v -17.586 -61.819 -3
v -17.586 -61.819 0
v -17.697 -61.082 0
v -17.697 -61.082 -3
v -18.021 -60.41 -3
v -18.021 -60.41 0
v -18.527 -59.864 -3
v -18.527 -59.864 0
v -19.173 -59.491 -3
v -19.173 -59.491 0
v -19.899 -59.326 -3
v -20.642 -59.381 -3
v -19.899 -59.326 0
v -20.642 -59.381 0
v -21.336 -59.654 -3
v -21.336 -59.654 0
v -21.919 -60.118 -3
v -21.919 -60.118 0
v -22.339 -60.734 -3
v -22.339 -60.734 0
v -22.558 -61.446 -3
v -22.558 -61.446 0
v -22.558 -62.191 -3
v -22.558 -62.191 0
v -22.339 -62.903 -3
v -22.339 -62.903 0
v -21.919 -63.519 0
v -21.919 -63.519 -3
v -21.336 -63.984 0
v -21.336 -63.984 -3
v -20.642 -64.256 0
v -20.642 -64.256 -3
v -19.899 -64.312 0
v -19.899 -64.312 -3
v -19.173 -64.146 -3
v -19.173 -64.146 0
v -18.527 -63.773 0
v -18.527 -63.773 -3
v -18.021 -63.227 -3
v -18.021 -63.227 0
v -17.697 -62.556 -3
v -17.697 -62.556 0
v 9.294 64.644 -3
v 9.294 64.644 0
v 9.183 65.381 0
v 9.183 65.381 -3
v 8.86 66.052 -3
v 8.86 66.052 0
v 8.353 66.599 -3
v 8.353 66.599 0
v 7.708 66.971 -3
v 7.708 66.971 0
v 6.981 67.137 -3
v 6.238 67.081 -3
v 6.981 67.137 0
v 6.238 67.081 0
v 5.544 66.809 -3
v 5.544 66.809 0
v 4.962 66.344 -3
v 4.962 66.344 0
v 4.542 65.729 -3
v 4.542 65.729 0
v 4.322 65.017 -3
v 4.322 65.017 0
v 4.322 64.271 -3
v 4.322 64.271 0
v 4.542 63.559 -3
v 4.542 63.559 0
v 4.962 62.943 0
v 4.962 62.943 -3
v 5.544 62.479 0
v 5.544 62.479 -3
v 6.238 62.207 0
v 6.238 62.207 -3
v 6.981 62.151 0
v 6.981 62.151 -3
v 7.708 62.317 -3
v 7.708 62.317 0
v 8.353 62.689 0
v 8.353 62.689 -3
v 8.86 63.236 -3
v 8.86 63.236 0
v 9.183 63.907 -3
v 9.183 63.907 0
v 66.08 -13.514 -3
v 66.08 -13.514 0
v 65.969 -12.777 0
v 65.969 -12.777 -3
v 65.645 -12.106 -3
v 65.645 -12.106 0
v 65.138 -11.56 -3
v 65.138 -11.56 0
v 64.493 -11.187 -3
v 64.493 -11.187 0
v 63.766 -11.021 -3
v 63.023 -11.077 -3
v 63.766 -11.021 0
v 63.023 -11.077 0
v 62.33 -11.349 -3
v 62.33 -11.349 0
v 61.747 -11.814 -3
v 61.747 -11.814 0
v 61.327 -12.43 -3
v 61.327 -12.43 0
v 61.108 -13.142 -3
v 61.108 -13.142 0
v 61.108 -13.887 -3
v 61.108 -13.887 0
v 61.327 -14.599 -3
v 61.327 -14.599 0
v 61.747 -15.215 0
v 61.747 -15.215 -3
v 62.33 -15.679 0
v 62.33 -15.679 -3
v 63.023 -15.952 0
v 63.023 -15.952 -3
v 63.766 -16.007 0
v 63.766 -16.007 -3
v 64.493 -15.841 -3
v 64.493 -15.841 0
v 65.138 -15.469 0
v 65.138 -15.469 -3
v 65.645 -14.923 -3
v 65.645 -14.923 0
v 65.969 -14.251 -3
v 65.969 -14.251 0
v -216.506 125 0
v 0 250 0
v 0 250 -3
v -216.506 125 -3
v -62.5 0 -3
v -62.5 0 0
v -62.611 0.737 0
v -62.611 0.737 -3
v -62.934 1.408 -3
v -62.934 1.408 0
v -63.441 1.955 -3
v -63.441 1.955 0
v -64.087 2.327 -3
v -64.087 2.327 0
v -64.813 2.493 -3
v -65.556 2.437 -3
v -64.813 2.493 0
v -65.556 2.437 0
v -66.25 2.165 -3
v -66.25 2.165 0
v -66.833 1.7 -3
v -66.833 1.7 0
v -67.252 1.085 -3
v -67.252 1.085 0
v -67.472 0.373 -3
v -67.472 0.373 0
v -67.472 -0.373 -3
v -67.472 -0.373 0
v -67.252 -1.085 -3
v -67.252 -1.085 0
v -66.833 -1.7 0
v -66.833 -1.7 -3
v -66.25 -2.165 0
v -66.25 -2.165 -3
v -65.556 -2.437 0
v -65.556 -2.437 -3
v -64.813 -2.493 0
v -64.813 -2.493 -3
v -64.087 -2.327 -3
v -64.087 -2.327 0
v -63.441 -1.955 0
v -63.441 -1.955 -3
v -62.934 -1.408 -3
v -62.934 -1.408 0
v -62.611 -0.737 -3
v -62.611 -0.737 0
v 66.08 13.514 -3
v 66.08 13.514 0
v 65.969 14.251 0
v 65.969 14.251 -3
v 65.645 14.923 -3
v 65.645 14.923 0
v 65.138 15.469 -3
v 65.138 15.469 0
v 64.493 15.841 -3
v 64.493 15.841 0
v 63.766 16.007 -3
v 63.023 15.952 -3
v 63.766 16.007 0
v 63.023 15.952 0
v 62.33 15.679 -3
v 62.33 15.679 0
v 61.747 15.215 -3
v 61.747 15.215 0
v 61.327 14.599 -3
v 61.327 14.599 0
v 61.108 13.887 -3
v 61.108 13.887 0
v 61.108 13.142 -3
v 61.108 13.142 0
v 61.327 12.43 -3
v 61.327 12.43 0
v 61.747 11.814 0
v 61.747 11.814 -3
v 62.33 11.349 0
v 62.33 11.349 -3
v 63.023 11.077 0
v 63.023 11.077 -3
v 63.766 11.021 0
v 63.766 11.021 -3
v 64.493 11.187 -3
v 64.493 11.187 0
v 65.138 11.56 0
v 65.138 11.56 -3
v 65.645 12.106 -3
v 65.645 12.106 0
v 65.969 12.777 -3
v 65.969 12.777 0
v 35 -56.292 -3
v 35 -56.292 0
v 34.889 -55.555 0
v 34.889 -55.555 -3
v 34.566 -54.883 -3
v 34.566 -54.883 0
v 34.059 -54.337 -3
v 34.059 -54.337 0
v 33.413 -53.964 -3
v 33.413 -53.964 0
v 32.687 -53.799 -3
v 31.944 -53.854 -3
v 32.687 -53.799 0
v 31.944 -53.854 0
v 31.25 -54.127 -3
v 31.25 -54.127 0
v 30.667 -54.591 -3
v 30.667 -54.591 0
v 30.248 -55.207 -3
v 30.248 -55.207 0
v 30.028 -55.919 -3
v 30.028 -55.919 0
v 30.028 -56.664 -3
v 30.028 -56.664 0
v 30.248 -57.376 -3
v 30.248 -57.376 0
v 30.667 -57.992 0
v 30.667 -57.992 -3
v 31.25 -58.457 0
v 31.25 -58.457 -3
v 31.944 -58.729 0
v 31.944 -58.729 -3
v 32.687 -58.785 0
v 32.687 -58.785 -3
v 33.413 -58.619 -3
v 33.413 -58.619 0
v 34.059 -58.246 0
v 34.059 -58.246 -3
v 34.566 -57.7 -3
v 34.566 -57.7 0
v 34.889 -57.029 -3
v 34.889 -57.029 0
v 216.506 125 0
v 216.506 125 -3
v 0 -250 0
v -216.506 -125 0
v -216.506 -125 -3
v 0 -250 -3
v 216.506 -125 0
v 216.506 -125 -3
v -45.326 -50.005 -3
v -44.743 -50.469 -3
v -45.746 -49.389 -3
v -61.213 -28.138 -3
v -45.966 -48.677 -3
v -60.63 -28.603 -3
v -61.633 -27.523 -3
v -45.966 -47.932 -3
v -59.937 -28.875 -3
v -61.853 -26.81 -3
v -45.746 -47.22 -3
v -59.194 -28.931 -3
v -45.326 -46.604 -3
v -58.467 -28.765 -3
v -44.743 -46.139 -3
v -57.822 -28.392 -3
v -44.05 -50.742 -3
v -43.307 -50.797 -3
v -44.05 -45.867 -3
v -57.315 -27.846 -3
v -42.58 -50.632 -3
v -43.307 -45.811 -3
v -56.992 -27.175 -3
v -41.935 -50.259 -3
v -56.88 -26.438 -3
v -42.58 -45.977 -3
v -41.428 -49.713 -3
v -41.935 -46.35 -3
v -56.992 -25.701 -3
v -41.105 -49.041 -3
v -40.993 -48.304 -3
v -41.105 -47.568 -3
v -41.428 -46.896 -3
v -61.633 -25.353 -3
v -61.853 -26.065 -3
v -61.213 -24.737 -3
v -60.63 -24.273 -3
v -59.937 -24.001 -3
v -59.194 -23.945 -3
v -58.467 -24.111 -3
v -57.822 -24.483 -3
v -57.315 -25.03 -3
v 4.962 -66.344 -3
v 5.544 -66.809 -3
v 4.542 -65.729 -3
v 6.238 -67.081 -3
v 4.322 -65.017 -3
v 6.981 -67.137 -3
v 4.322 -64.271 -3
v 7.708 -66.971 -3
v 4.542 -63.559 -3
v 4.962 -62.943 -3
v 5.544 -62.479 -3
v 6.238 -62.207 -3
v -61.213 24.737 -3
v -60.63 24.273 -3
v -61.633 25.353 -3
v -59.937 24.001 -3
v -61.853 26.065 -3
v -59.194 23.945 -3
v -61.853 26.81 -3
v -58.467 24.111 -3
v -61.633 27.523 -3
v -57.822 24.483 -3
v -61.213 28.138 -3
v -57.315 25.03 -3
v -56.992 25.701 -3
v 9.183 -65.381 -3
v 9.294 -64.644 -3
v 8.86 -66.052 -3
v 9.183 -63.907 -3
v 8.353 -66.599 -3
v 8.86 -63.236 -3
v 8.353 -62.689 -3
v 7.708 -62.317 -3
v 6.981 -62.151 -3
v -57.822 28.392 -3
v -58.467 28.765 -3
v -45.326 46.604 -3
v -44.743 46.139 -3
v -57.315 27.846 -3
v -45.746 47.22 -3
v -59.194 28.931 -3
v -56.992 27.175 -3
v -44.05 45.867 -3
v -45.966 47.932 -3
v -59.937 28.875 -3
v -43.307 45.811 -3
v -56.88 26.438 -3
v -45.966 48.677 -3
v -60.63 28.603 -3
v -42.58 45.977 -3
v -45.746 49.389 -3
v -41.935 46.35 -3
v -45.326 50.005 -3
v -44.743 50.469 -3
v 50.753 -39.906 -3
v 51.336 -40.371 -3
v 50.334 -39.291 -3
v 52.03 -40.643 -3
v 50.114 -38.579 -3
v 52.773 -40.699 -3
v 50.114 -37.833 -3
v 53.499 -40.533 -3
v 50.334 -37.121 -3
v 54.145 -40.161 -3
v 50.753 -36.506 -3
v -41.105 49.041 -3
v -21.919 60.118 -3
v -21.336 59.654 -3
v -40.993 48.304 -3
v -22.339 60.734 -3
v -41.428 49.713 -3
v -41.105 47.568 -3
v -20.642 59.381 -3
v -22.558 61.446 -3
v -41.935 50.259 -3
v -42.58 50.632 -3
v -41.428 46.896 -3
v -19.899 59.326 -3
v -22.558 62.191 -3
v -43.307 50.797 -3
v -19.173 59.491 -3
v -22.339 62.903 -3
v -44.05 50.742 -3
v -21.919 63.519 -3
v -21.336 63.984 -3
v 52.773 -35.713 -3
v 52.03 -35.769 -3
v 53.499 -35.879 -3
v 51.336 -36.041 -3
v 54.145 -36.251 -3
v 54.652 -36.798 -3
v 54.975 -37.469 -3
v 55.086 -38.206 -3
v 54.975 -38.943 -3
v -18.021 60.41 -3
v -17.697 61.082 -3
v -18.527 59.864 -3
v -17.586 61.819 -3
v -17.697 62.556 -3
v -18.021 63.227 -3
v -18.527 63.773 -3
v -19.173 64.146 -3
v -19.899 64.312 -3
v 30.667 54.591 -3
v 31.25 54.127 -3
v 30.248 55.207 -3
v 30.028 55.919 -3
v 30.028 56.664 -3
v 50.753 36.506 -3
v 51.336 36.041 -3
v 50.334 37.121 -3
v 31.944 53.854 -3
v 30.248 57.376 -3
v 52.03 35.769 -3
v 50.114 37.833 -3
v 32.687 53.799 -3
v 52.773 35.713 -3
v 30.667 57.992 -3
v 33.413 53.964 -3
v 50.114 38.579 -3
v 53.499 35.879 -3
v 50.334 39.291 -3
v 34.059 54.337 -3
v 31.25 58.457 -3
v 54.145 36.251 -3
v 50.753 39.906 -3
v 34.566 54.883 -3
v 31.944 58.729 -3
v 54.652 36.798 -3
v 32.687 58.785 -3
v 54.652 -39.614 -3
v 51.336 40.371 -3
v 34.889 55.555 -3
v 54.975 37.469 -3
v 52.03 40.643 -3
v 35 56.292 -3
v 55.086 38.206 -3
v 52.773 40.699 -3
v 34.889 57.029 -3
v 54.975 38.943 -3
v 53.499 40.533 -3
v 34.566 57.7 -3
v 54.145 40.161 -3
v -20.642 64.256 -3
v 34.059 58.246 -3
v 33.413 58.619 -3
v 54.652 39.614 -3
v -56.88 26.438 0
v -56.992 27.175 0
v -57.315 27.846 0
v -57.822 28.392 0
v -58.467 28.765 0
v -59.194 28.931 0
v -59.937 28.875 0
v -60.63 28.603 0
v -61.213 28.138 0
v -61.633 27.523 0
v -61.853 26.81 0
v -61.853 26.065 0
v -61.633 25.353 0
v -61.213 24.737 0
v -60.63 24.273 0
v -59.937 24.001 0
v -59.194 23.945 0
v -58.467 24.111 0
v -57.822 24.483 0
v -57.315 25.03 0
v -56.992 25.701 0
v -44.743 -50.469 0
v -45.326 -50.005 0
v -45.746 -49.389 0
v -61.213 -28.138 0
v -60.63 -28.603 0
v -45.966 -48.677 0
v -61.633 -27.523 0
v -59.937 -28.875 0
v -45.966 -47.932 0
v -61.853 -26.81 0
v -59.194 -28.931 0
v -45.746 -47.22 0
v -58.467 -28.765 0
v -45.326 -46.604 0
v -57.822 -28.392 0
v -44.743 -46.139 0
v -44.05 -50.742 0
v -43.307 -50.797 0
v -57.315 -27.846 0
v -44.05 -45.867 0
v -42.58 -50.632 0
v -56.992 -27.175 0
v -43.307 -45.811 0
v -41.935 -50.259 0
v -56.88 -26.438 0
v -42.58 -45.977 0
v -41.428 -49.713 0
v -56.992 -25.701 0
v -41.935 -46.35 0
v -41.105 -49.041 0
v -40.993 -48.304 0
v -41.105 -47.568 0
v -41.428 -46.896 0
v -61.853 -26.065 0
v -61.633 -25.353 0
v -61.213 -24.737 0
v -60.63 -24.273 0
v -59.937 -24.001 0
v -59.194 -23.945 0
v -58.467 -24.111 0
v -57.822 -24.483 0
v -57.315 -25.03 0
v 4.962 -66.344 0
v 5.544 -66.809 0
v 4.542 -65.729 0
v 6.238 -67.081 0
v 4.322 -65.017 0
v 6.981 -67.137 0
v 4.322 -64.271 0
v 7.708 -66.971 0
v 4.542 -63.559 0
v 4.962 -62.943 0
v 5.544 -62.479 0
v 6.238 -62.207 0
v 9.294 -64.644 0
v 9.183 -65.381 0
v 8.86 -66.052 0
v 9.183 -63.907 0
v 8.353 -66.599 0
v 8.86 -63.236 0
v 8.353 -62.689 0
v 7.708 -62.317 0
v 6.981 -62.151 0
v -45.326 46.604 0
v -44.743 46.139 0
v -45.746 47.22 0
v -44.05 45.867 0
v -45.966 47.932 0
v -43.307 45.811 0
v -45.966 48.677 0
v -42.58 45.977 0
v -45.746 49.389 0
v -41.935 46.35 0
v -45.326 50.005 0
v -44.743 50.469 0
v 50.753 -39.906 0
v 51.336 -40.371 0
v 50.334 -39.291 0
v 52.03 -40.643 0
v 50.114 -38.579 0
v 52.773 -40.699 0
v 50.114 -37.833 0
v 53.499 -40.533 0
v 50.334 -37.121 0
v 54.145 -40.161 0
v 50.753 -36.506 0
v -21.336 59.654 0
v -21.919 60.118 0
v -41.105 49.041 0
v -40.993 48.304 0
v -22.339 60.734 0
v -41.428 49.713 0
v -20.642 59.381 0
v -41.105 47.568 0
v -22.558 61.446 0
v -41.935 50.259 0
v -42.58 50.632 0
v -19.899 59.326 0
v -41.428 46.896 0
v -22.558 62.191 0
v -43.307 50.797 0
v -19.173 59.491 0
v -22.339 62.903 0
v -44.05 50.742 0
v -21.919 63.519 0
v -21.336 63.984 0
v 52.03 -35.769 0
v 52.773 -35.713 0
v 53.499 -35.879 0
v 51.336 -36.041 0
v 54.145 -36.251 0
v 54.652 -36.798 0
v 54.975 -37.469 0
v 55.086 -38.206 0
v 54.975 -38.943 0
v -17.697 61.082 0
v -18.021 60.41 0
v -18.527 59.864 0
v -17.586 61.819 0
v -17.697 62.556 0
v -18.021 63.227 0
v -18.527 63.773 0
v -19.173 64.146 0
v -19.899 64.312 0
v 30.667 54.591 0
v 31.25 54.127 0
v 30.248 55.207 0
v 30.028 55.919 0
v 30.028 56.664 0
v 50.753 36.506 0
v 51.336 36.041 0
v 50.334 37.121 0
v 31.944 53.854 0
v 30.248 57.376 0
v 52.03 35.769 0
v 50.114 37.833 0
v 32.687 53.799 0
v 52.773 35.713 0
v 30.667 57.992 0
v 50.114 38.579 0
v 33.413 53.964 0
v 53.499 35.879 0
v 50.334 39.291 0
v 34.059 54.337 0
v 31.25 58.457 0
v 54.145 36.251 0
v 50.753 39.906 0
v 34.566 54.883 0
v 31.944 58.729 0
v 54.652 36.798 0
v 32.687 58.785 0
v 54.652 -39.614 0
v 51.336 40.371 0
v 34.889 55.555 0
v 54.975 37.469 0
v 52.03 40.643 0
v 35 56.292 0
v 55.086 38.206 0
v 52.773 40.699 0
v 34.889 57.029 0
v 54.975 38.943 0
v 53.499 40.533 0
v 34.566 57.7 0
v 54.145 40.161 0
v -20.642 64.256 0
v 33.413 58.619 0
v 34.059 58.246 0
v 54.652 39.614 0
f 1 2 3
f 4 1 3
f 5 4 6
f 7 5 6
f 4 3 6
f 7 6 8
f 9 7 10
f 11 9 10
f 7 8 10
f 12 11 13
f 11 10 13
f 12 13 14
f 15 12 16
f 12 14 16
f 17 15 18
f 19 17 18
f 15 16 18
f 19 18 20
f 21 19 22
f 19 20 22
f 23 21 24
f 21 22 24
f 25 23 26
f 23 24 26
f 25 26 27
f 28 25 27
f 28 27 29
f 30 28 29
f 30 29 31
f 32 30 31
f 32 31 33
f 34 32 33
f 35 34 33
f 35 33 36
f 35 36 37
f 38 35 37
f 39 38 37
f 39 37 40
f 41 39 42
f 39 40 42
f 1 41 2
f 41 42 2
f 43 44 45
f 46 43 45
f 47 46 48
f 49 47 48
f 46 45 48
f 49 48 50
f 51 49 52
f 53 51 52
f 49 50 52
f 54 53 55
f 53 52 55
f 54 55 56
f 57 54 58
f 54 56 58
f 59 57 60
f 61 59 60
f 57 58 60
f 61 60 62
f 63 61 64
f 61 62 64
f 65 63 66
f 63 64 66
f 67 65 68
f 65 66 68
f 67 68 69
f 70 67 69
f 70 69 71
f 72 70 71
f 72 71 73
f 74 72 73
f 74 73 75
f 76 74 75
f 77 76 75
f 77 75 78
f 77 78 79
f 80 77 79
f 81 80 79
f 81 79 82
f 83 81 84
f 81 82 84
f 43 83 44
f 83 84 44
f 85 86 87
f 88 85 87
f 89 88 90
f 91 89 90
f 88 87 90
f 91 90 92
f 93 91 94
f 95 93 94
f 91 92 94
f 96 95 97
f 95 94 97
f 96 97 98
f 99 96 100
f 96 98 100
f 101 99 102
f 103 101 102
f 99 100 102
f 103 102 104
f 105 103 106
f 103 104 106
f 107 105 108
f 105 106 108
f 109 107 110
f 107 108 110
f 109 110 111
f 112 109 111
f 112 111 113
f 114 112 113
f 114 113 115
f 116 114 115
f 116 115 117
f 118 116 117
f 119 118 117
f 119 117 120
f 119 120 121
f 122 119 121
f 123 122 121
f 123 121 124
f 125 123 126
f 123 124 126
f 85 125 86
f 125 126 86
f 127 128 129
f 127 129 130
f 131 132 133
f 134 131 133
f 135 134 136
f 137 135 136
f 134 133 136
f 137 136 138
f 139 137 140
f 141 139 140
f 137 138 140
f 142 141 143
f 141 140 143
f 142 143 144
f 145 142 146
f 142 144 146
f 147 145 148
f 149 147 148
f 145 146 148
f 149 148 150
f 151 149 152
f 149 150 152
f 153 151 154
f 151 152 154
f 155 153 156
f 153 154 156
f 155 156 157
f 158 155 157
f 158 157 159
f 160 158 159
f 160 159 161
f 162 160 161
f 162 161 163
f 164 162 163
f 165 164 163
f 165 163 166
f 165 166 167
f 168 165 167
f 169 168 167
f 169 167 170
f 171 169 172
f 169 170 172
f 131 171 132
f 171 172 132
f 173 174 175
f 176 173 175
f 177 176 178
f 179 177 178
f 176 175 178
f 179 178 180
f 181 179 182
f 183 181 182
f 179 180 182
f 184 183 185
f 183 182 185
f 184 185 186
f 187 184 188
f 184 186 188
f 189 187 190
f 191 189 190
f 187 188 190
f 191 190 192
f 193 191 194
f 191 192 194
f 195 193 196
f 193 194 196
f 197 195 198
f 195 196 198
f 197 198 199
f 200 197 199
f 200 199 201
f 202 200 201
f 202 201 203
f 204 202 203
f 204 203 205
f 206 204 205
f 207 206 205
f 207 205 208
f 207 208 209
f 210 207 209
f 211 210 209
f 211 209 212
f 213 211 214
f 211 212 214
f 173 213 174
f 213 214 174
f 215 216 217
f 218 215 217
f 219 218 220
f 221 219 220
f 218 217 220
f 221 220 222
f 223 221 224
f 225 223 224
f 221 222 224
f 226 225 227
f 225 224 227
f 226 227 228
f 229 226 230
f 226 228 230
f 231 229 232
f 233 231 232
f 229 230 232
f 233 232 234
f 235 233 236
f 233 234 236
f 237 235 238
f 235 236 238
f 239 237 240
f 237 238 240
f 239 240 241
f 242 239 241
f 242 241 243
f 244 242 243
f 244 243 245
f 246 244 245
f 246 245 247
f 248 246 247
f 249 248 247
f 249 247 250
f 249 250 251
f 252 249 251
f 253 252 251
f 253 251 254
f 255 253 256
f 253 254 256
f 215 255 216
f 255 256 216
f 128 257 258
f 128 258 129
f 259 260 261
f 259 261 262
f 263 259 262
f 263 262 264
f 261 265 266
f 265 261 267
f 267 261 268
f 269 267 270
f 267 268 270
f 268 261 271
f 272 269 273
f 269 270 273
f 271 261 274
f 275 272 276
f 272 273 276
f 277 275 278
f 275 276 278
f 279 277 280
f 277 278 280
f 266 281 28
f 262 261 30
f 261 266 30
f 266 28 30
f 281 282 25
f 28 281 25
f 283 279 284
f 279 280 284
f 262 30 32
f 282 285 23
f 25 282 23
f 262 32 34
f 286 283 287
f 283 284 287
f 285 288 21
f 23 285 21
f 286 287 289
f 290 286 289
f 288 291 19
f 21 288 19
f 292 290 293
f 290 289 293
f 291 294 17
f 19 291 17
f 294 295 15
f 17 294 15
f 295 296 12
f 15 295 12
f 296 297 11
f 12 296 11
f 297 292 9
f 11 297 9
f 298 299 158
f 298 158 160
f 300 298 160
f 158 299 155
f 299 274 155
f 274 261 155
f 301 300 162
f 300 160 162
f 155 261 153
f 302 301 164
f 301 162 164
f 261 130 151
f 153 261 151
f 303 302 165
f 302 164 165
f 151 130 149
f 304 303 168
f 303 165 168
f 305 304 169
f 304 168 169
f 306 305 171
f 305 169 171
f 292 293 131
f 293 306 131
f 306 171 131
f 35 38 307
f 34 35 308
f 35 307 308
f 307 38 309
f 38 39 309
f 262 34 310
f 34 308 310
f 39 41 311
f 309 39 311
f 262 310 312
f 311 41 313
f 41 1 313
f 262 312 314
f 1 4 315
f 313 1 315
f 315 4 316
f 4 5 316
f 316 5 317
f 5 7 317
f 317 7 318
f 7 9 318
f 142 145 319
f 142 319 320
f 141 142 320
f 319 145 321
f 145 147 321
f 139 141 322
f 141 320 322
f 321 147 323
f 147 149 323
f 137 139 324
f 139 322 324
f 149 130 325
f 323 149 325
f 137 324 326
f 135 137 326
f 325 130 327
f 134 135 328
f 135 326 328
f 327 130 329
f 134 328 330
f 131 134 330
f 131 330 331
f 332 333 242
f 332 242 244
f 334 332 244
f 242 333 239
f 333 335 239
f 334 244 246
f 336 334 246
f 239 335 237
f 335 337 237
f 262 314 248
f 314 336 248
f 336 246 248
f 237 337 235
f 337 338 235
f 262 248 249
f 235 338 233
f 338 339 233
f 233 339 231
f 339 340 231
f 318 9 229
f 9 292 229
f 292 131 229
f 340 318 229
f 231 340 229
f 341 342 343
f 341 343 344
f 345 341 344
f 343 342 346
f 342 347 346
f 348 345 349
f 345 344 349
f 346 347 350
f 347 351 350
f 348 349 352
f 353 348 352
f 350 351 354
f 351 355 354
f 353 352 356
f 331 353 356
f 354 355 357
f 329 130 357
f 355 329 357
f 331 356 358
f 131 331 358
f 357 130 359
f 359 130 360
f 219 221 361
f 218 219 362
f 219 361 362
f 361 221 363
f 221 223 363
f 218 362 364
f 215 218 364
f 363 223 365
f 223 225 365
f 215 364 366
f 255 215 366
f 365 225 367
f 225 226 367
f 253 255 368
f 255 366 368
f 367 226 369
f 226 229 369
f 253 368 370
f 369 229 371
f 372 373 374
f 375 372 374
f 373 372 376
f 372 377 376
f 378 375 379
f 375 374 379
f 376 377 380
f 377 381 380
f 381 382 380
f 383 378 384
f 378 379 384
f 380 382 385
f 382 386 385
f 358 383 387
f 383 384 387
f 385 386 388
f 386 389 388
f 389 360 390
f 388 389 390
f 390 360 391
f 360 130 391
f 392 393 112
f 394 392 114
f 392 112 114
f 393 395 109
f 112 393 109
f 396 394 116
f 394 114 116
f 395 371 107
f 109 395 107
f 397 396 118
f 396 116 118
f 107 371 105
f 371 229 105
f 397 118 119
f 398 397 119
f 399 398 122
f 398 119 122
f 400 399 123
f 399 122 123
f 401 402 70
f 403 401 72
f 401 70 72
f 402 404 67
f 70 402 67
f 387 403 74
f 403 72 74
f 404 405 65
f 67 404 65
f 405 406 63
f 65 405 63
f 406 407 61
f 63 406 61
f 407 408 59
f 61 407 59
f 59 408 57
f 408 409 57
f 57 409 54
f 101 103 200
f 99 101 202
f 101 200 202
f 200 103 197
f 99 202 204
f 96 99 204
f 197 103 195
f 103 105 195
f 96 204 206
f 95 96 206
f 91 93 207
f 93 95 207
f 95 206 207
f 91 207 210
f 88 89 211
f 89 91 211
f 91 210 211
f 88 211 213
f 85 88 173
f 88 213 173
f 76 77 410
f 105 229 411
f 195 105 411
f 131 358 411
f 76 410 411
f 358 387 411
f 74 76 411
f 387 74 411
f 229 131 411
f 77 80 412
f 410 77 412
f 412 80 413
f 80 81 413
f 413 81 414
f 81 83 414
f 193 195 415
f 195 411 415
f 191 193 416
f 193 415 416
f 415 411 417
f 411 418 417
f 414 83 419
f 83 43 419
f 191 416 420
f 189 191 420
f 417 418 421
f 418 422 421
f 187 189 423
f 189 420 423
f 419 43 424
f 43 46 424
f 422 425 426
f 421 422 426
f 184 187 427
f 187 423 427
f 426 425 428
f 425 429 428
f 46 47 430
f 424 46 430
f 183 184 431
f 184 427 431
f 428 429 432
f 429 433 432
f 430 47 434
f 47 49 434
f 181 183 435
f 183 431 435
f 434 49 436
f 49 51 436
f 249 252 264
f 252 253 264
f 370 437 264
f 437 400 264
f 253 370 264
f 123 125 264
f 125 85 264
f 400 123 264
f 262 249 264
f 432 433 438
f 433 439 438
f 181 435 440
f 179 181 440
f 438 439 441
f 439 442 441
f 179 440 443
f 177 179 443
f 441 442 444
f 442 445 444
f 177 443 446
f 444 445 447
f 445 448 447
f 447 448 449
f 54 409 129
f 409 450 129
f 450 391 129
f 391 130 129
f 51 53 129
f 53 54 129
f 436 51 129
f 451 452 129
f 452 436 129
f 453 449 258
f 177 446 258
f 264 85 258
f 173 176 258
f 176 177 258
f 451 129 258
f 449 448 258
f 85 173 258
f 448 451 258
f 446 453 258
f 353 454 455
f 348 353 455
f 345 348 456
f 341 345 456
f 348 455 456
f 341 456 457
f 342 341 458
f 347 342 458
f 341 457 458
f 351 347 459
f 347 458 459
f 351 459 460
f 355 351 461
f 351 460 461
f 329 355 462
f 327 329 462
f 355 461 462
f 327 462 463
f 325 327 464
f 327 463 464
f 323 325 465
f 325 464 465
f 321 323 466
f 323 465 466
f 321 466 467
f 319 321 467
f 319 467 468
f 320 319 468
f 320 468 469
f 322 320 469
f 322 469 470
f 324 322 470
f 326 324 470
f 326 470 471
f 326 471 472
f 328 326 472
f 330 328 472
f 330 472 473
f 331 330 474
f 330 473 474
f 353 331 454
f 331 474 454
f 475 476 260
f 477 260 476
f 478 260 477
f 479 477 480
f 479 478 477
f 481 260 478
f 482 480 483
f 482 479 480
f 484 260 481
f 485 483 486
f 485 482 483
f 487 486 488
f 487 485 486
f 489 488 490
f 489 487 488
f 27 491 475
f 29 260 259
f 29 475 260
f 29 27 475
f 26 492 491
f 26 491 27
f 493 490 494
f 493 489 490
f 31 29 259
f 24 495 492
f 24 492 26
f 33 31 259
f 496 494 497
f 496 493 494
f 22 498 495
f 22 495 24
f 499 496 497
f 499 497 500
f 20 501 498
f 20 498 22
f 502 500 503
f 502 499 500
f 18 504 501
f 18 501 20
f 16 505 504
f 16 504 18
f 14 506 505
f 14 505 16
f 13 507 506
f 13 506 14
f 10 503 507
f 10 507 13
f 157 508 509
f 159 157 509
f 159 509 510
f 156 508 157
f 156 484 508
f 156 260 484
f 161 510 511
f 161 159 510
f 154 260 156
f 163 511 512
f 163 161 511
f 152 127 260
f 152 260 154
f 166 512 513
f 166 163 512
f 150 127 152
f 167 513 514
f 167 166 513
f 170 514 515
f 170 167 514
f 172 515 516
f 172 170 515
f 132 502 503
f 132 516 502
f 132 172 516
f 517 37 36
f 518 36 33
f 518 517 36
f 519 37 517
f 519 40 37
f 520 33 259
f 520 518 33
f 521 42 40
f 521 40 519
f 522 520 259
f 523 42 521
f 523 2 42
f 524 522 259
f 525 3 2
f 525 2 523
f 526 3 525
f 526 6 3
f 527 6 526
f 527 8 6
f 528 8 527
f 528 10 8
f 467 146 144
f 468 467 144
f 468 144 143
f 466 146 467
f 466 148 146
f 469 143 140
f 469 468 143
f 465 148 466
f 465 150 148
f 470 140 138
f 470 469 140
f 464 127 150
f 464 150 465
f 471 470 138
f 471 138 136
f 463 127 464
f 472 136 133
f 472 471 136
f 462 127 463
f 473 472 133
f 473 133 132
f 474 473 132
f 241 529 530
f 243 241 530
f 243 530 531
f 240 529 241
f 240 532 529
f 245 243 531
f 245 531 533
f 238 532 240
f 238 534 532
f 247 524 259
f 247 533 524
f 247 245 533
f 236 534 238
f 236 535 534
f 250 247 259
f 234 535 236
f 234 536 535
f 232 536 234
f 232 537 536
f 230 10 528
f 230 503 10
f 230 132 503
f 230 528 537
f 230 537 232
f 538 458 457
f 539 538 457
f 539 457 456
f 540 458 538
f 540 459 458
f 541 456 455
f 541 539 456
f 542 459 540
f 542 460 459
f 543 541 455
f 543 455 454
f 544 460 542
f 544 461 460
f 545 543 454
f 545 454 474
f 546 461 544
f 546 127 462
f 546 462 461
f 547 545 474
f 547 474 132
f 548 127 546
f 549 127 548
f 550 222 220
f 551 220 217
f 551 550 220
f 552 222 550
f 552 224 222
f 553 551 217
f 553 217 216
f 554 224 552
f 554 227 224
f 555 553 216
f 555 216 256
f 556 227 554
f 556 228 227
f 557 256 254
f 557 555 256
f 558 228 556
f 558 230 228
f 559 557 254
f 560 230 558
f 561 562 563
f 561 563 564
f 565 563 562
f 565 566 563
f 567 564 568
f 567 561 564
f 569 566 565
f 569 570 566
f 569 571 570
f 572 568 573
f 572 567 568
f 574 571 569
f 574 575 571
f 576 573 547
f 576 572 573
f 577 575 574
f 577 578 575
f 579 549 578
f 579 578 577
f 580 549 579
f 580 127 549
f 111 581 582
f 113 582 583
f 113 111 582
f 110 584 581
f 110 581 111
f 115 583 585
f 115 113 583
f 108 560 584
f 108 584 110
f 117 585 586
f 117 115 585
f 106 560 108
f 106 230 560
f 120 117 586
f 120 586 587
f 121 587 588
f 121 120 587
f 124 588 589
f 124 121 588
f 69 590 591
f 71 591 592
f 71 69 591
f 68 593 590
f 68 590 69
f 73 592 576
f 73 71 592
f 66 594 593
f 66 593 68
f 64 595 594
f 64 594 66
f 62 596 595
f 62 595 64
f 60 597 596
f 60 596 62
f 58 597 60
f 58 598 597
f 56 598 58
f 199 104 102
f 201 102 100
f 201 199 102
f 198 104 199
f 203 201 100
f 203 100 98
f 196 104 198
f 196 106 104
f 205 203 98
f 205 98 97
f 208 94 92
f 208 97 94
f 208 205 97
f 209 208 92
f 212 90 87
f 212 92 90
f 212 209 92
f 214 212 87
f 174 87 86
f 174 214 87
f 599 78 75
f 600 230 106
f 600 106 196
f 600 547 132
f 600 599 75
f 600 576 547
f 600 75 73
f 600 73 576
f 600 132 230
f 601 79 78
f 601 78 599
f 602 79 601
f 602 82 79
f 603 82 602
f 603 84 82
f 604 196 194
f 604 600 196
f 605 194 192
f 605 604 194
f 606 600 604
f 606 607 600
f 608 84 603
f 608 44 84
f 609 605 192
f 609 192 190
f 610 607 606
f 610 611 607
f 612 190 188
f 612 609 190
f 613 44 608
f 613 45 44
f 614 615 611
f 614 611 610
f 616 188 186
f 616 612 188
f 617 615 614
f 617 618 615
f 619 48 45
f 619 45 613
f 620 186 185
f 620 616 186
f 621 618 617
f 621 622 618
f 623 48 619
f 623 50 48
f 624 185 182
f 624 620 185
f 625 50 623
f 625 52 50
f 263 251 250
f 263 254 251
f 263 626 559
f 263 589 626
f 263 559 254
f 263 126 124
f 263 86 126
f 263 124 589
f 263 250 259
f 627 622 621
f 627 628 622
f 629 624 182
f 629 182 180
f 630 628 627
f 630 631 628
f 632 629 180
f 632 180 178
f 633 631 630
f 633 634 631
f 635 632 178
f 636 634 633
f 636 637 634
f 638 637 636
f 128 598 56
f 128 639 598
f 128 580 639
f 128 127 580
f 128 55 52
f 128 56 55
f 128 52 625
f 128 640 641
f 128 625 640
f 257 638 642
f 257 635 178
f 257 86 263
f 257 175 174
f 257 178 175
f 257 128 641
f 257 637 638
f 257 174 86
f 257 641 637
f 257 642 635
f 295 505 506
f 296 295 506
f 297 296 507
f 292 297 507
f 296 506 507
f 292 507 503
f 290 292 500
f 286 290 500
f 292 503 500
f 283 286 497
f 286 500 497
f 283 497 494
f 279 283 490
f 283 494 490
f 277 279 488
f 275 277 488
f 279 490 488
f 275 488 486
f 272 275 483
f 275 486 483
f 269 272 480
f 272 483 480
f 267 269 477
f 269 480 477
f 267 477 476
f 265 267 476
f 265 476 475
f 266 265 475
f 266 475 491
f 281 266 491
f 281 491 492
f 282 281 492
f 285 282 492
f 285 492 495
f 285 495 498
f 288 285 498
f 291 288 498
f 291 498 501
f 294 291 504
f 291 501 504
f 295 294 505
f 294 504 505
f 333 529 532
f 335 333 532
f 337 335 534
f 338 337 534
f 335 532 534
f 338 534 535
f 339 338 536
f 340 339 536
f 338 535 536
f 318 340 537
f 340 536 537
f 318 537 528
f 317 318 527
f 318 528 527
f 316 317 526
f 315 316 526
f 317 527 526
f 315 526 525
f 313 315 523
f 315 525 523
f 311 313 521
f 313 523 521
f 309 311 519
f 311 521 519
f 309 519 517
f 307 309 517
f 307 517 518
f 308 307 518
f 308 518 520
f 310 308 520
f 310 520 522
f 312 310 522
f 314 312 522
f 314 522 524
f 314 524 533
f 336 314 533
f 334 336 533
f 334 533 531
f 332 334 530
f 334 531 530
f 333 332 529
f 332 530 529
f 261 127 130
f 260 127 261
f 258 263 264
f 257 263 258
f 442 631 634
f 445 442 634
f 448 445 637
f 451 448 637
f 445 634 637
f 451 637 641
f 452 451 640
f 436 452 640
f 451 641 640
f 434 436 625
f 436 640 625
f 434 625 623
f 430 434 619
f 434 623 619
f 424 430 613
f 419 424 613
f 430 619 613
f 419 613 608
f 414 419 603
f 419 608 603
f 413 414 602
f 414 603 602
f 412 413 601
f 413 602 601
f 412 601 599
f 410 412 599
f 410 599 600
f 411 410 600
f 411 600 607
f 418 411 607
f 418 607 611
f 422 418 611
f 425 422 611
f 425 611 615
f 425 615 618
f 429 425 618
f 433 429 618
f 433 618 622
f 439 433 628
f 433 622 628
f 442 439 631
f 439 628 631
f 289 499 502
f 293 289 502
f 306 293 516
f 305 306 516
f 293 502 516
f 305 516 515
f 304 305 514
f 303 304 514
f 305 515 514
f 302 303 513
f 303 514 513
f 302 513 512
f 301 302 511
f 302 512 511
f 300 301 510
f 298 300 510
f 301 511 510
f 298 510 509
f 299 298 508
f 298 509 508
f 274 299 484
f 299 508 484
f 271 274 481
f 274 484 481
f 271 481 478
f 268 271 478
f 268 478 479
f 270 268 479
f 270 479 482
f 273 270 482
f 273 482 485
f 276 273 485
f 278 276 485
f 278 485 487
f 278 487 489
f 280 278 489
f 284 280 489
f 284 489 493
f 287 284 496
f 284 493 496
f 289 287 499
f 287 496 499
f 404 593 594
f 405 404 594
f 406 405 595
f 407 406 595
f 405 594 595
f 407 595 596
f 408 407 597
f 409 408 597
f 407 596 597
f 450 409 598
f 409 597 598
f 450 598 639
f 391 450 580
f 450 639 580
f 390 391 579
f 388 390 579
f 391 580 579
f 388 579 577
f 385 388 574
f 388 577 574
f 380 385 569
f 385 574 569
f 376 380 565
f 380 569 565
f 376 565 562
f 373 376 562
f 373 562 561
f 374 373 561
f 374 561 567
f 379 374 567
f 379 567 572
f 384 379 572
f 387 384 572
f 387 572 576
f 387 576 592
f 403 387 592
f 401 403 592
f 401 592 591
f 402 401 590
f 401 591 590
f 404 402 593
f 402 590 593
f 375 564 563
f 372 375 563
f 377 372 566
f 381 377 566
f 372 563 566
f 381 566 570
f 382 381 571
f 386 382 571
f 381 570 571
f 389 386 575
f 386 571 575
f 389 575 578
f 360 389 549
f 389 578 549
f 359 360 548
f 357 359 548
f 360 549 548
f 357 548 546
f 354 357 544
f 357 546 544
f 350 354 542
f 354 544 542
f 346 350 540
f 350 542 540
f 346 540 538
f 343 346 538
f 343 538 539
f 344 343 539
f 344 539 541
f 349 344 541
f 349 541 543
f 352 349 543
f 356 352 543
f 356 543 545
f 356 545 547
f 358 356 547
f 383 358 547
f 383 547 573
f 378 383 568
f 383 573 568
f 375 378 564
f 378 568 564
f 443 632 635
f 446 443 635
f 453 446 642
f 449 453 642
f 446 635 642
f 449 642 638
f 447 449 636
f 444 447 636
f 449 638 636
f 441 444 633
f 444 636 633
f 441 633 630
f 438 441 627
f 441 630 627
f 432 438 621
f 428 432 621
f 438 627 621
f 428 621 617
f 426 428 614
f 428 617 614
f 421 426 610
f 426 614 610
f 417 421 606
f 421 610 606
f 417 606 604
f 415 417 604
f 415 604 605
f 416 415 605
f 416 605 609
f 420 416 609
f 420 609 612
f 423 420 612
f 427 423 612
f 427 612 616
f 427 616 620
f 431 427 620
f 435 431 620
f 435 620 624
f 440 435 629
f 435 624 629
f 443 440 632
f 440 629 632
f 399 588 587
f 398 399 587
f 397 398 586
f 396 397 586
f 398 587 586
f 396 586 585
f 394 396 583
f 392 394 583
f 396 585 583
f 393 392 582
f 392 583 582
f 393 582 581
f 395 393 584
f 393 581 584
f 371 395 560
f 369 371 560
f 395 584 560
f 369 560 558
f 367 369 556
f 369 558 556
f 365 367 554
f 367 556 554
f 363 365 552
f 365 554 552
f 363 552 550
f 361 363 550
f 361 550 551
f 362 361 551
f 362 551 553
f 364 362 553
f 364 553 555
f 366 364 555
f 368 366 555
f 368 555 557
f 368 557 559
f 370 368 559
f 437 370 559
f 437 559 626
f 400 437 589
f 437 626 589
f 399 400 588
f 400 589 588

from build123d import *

# Parameters (mm, degrees)
F1_DEPTH = 3
F2_R     = 2.5
F3_DEPTH = 3


with BuildPart() as f1:
    # F0 (on Top) → F1 (new body)
    with BuildSketch(Plane.XY):
        with BuildLine():
            ThreePointArc((108.2531706913, -187.5000027607), (187.4999986196, -108.2531778639), (216.5063509461, 0))
            ThreePointArc((216.5063509461, 0), (187.4999990763, 108.253177073), (108.2531722731, 187.5000018475))
            ThreePointArc((108.2531722731, 187.5000018475), (1.0905e-06, 216.5063509461), (-108.2531703844, 187.5000029379))
            ThreePointArc((-108.2531703844, 187.5000029379), (-187.4999985558, 108.2531779745), (-216.5063509461, -9.91e-08))
            ThreePointArc((-216.5063509461, -9.91e-08), (-187.4999988892, -108.2531773971), (-108.2531717109, -187.5000021721))
            ThreePointArc((-108.2531717109, -187.5000021721), (-5.886e-07, -216.5063509461), (108.2531706913, -187.5000027607))
        make_face()
        with BuildLine():
            ThreePointArc((-216.5063509461, -9.91e-08), (-187.4999985558, 108.2531779745), (-108.2531703844, 187.5000029379))
            Line((-108.2531703844, 187.5000029379), (-216.5063509461, 125))
            Line((-216.5063509461, 125), (-216.5063509461, -9.91e-08))
        make_face()
        with BuildLine():
            ThreePointArc((-108.2531703844, 187.5000029379), (1.0905e-06, 216.5063509461), (108.2531722731, 187.5000018475))
            Line((108.2531722731, 187.5000018475), (0, 250))
            Line((0, 250), (-108.2531703844, 187.5000029379))
        make_face()
        with BuildLine():
            ThreePointArc((108.2531722731, 187.5000018475), (187.4999990763, 108.253177073), (216.5063509461, 0))
            Line((216.5063509461, 0), (216.5063509461, 125))
            Line((216.5063509461, 125), (108.2531722731, 187.5000018475))
        make_face()
        with BuildLine():
            Line((216.5063509461, -125), (216.5063509461, 0))
            ThreePointArc((216.5063509461, 0), (187.4999986196, -108.2531778639), (108.2531706913, -187.5000027607))
            Line((108.2531706913, -187.5000027607), (216.5063509461, -125))
        make_face()
        with BuildLine():
            Line((0, -250), (108.2531706913, -187.5000027607))
            ThreePointArc((108.2531706913, -187.5000027607), (-5.886e-07, -216.5063509461), (-108.2531717109, -187.5000021721))
            Line((-108.2531717109, -187.5000021721), (0, -250))
        make_face()
        with BuildLine():
            Line((-216.5063509461, -125), (-108.2531717109, -187.5000021721))
            ThreePointArc((-108.2531717109, -187.5000021721), (-187.4999988892, -108.2531773971), (-216.5063509461, -9.91e-08))
            Line((-216.5063509461, -9.91e-08), (-216.5063509461, -125))
        make_face()
    extrude(amount=-F1_DEPTH)

    # F2 (on face) → F3 (cut, through all)
    with BuildSketch(Plane.XY):
        with Locations((-65, 0)):
            Circle(F2_R)
        with Locations((32.5, -56.291651246)):
            Circle(F2_R)
        with Locations((6.7943501124, -64.6439231989)):
            Circle(F2_R)
        with Locations((-20.0861046344, -61.8186735592)):
            Circle(F2_R)
        with Locations((-43.4934894133, -48.304413656)):
            Circle(F2_R)
        with Locations((-59.3804547468, -26.4378817999)):
            Circle(F2_R)
        with Locations((-59.3804547468, 26.4378817999)):
            Circle(F2_R)
        with Locations((-43.4934894133, 48.304413656)):
            Circle(F2_R)
        with Locations((-20.0861046344, 61.8186735592)):
            Circle(F2_R)
        with Locations((6.7943501124, 64.6439231989)):
            Circle(F2_R)
        with Locations((32.5, 56.291651246)):
            Circle(F2_R)
        with Locations((52.5861046344, 38.206041399)):
            Circle(F2_R)
        with Locations((63.5795940477, 13.5142599032)):
            Circle(F2_R)
        with Locations((63.5795940477, -13.5142599032)):
            Circle(F2_R)
        with Locations((52.5861046344, -38.206041399)):
            Circle(F2_R)
    extrude(amount=-F3_DEPTH, mode=Mode.SUBTRACT)


solid = f1.part
